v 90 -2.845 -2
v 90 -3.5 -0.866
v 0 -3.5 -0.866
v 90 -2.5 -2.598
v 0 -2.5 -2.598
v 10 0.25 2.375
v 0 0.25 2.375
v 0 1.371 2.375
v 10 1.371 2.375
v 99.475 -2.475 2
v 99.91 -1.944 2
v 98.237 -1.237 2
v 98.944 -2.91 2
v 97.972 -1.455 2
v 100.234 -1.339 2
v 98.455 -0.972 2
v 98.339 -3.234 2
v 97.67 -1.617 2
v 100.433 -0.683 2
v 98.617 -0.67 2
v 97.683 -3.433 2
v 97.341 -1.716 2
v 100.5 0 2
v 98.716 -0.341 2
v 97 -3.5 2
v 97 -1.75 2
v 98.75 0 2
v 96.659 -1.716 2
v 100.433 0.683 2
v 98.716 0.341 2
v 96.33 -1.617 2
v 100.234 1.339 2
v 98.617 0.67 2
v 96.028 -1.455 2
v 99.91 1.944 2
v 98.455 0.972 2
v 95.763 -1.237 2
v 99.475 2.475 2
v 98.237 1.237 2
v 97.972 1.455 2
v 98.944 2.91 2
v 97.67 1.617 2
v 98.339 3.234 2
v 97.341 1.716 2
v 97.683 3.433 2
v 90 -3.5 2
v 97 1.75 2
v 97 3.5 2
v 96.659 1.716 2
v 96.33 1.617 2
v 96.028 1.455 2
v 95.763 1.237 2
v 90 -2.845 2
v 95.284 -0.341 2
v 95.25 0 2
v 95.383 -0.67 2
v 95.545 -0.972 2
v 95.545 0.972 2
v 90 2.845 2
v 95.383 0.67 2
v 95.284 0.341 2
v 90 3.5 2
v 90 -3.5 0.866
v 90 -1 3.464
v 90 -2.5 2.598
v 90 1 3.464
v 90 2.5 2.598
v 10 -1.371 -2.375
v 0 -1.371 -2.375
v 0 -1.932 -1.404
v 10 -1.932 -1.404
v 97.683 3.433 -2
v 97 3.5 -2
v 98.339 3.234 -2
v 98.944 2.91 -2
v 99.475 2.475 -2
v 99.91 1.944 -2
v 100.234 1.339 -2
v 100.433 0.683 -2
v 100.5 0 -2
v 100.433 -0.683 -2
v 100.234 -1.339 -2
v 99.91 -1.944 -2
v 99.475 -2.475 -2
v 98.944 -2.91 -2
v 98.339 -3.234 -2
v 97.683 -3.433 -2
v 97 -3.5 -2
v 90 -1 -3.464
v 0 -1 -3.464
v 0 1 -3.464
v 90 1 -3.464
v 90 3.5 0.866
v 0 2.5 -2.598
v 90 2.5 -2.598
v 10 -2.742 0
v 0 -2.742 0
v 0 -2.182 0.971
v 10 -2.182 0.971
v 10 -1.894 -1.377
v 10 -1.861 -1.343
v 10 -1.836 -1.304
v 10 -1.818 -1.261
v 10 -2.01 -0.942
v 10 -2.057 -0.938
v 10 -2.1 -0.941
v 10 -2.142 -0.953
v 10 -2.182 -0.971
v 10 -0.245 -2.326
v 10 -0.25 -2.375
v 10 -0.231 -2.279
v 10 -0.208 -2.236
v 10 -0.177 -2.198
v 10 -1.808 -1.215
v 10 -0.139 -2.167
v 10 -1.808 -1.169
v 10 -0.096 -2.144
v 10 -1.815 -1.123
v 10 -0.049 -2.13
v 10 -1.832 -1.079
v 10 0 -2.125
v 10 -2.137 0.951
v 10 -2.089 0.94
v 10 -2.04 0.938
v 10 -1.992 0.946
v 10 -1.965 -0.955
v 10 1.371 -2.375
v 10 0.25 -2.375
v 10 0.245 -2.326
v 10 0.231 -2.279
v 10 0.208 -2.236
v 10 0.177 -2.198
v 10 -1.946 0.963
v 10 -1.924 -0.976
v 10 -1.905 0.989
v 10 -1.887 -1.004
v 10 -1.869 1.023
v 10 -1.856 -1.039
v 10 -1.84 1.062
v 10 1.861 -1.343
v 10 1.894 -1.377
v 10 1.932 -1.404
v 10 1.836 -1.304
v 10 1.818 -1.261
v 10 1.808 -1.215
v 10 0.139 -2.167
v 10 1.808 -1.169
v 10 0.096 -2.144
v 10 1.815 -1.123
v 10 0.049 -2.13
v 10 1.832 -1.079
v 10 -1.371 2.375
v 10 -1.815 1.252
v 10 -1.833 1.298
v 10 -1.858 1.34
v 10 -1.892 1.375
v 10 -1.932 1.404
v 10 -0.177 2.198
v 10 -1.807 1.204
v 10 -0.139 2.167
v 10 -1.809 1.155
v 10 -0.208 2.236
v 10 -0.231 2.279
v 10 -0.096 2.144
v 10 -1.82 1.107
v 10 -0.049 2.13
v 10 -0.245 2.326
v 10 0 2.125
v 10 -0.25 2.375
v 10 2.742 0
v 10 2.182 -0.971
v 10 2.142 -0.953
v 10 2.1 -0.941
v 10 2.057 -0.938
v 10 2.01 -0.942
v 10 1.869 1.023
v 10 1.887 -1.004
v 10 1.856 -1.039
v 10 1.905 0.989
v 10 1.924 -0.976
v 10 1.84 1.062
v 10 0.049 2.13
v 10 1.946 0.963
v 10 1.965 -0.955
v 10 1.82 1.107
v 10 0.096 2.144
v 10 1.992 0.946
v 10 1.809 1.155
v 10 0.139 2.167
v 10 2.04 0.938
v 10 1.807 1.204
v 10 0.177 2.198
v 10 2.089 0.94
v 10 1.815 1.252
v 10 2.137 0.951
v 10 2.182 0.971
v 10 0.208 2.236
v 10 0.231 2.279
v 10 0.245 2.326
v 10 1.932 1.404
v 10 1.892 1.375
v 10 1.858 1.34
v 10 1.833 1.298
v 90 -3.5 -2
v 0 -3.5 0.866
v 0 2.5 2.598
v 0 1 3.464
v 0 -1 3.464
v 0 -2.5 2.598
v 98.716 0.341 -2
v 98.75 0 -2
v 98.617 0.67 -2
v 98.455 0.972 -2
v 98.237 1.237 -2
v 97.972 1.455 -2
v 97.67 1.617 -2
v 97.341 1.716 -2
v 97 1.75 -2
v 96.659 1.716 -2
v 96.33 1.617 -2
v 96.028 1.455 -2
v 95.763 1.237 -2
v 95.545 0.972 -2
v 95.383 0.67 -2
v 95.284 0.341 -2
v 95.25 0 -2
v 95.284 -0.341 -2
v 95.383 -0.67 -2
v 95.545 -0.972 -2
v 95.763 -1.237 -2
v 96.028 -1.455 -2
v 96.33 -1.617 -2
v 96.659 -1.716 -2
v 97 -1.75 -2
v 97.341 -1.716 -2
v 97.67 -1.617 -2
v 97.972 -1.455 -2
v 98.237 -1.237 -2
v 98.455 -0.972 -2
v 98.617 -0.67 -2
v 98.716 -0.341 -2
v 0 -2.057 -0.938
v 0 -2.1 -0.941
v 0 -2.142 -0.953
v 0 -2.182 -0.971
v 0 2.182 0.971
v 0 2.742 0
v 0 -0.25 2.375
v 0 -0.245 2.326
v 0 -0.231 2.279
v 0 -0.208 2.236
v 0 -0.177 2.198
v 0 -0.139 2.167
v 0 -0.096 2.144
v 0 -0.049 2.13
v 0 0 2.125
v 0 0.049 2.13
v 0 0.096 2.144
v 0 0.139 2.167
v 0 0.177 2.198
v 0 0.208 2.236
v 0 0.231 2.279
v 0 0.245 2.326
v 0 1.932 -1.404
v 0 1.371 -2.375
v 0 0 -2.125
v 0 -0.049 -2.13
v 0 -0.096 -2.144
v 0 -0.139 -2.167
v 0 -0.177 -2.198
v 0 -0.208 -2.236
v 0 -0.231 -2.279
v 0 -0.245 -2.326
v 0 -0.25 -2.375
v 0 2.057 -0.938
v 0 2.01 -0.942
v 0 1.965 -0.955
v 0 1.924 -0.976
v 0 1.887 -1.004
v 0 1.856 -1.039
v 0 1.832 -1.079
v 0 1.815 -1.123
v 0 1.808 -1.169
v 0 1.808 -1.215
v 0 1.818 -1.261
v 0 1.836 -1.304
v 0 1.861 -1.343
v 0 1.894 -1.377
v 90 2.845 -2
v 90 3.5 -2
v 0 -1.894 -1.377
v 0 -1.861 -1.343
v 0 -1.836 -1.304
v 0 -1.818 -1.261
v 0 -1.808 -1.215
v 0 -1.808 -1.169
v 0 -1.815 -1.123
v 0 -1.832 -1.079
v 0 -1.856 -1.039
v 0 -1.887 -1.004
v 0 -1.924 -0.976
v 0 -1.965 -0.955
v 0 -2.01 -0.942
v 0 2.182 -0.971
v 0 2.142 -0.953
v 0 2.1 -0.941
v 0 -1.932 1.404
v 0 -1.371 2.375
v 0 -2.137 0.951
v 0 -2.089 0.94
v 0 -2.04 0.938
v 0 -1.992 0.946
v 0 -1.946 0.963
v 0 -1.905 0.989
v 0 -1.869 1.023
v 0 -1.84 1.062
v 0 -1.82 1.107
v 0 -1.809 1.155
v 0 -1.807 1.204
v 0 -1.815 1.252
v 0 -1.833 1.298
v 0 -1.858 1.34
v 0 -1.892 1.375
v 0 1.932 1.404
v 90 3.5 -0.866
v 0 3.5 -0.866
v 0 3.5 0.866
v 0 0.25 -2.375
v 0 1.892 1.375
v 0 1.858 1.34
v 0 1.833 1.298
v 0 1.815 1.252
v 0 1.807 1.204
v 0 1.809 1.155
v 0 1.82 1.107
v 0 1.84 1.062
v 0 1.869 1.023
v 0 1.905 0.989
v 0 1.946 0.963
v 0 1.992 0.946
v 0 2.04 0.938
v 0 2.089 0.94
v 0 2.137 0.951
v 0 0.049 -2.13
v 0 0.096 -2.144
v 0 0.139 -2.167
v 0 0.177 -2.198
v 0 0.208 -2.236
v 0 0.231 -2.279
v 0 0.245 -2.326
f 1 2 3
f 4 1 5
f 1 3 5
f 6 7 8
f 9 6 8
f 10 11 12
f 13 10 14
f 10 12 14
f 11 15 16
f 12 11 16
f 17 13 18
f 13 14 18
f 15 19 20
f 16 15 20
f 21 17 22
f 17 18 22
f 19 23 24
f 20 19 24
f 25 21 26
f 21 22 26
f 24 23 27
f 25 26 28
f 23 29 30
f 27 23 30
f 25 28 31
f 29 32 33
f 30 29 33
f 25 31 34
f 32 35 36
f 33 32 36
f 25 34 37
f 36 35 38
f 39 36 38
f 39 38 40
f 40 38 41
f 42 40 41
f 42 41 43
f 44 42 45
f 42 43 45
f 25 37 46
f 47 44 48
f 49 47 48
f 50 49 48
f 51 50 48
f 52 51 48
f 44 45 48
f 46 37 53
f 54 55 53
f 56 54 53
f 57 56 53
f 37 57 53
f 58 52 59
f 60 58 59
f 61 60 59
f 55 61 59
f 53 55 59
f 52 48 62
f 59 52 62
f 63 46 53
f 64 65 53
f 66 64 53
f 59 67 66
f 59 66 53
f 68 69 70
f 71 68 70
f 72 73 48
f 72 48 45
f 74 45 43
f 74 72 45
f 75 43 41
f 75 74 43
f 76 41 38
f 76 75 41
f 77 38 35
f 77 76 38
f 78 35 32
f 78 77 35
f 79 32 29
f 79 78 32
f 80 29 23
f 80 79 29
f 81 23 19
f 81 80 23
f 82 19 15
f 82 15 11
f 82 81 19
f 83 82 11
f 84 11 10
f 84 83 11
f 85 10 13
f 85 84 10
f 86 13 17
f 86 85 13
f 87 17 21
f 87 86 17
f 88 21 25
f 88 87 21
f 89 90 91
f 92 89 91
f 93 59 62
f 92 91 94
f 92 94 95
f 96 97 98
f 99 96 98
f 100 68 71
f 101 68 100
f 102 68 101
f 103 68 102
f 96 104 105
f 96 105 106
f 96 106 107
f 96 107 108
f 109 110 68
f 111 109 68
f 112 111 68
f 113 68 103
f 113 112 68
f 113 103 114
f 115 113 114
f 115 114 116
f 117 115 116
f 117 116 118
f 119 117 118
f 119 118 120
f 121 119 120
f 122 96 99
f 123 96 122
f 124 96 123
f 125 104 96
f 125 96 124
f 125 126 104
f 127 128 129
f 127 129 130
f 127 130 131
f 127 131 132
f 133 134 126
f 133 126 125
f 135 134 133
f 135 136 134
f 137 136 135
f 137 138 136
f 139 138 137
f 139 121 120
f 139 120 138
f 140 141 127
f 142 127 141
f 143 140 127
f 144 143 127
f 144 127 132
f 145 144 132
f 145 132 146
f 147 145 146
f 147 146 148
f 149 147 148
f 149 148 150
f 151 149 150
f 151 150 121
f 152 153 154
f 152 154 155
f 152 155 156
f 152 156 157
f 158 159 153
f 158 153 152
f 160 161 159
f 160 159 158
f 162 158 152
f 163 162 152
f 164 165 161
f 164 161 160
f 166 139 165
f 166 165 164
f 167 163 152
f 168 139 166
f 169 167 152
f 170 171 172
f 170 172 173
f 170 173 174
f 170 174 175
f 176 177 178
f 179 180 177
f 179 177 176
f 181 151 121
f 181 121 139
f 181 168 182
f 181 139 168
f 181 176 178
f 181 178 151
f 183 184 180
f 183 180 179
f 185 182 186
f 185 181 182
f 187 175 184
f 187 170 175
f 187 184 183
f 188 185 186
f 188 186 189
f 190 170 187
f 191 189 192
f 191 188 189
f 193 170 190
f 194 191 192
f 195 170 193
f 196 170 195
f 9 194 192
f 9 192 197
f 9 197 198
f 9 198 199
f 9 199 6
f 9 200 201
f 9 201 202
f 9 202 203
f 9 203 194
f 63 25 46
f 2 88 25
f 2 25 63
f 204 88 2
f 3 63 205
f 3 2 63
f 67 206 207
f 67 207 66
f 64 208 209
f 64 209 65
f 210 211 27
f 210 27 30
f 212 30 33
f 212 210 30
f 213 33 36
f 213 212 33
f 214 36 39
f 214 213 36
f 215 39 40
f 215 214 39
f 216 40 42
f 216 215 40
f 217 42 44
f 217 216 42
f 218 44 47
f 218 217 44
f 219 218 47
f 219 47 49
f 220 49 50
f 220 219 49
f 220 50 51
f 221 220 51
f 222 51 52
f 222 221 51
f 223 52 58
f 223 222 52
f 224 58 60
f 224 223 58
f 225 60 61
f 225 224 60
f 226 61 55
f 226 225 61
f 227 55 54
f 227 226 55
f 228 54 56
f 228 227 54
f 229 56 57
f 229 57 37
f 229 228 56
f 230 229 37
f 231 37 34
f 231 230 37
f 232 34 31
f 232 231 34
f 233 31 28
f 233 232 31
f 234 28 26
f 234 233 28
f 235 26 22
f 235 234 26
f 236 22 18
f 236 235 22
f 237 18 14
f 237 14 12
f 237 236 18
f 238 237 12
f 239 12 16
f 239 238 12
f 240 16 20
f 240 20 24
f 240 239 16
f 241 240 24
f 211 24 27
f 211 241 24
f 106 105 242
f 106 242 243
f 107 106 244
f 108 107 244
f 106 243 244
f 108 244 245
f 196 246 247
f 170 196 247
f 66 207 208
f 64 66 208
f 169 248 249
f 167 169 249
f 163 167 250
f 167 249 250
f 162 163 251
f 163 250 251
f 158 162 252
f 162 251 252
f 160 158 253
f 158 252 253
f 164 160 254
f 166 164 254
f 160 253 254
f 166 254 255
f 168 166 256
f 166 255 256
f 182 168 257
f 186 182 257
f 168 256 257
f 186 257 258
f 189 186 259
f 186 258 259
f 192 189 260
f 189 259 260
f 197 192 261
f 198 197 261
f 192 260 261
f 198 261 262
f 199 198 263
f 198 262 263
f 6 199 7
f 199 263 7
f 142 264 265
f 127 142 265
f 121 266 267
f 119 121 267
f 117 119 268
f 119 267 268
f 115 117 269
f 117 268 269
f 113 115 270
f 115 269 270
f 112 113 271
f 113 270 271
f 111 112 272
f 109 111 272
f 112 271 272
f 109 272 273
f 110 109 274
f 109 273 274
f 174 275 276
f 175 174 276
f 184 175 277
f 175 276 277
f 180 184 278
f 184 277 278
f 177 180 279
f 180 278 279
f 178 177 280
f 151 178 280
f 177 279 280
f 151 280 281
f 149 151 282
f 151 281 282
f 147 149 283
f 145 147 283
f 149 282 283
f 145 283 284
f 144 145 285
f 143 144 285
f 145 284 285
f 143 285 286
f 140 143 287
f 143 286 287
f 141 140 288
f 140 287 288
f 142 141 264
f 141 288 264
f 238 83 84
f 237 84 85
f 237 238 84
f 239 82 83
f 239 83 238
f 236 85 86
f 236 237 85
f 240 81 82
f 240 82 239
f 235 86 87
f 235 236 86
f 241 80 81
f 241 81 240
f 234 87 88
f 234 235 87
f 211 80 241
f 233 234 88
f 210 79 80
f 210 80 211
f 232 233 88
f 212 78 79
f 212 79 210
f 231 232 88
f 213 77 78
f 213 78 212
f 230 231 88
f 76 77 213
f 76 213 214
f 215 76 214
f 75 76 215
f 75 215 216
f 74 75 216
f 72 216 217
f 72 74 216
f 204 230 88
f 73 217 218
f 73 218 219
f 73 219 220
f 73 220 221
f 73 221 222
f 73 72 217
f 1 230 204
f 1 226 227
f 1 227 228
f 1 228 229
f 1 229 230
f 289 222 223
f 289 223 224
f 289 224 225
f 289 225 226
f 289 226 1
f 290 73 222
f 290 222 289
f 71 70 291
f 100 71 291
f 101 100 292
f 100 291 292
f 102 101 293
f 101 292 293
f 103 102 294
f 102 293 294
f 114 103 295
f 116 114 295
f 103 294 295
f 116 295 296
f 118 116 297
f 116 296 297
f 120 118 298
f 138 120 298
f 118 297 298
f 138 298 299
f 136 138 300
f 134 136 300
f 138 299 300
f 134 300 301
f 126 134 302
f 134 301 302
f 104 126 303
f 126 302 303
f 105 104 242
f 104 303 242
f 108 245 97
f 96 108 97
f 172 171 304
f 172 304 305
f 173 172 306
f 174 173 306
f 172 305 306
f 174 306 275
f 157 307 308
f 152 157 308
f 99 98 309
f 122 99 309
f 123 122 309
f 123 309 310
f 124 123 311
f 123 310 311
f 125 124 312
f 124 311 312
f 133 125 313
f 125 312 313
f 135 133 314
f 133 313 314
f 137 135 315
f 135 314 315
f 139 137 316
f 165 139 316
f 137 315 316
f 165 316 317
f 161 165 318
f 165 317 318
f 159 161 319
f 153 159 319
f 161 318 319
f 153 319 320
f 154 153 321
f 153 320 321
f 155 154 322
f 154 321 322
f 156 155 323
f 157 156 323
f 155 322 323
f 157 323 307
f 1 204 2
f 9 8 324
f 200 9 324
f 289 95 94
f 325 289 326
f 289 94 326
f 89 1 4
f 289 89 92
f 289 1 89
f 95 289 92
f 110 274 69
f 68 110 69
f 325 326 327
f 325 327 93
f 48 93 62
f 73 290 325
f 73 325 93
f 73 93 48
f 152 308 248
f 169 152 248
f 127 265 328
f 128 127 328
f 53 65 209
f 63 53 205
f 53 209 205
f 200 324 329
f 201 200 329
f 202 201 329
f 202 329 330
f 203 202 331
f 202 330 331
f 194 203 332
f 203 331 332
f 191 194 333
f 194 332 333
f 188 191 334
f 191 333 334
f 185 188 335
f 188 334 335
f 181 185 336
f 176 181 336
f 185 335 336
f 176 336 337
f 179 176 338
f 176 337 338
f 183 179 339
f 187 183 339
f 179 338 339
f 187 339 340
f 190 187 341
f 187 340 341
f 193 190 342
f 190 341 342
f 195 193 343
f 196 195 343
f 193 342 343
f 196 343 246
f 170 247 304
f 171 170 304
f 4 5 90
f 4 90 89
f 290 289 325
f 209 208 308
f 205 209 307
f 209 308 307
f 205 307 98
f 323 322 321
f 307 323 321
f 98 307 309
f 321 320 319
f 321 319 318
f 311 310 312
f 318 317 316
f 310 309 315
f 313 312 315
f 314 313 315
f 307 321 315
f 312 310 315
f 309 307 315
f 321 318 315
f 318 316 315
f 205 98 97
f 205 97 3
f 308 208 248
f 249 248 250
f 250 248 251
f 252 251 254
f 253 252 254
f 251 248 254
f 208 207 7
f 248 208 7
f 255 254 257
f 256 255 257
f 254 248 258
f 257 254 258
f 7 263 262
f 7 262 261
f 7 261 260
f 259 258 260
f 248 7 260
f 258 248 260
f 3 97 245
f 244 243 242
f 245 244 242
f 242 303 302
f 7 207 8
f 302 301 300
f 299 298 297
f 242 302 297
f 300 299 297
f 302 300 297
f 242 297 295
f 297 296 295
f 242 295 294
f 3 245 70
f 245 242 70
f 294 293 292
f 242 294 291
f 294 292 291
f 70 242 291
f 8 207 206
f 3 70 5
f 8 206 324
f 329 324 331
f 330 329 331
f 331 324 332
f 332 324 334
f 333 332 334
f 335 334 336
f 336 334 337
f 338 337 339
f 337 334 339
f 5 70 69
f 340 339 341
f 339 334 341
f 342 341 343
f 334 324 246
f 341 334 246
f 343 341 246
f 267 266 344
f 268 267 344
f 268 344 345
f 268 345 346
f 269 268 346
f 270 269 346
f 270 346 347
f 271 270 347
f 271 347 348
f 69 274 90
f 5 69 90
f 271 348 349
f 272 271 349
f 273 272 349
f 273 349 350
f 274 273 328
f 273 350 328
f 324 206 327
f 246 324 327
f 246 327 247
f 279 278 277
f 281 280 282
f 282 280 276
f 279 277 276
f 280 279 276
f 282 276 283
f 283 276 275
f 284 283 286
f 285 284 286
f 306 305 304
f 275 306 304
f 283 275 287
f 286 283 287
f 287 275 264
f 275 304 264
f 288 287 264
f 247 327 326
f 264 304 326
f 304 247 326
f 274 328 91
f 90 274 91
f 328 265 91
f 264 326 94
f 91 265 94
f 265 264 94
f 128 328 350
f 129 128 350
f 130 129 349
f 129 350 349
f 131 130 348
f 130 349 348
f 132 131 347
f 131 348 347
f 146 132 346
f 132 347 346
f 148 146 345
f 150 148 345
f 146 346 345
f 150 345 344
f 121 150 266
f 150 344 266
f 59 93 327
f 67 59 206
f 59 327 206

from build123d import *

# Parameters (mm, degrees)
BOSS_EXTRUDE1_DEPTH      = 90
CUT_EXTRUDE1_DEPTH       = 10
CHAMFER1_SIZE            = 1
CHAMFER1_EDGE_2_SIZE     = 1
CHAMFER1_EDGE_3_SIZE     = 1
CHAMFER1_EDGE_4_SIZE     = 1
CHAMFER1_EDGE_5_SIZE     = 1
CHAMFER1_EDGE_6_SIZE     = 1
BOSS_EXTRUDE2_DEPTH      = 2
BOSS_EXTRUDE2_DEPTH_BACK = 2
SKETCH2_R                = 1.75


with BuildPart() as part:
    # Sketch1 → Boss-Extrude1 (new body)
    with BuildSketch(Plane(origin=(0, 0, 0), x_dir=(0, 0, -1), z_dir=(1, 0, 0))):
        Polygon((3.464101615, -2), (3.464101615, 2), (0, 4), (-3.464101615, 2), (-3.464101615, -2), (0, -4), align=None)
    extrude(amount=BOSS_EXTRUDE1_DEPTH)

    # Sketch5 → Cut-Extrude1 (cut)
    with BuildSketch(Plane.ZY):
        with BuildLine():
            Line((1.404006351, -1.931810334), (2.375, -1.371206889))
            Line((2.375, -1.371206889), (2.375, -0.25))
            ThreePointArc((2.375, -0.25), (2.125, 0), (2.375, 0.25))
            Line((2.375, 0.25), (2.375, 1.371206889))
            Line((2.375, 1.371206889), (1.404006351, 1.931810334))
            ThreePointArc((1.404006351, 1.931810334), (1.0625, 1.840303983), (0.970993649, 2.181810334))
            Line((0.970993649, 2.181810334), (0, 2.742413779))
            Line((0, 2.742413779), (-0.970993649, 2.181810334))
            ThreePointArc((-0.970993649, 2.181810334), (-0.946018543, 2.121515095), (-0.9375, 2.056810334))
            ThreePointArc((-0.9375, 2.056810334), (-1.122795239, 1.815328877), (-1.404006351, 1.931810334))
            Line((-1.404006351, 1.931810334), (-2.375, 1.371206889))
            Line((-2.375, 1.371206889), (-2.375, 0.25))
            ThreePointArc((-2.375, 0.25), (-2.198223305, 0.176776695), (-2.125, 0))
            ThreePointArc((-2.125, 0), (-2.198223305, -0.176776695), (-2.375, -0.25))
            Line((-2.375, -0.25), (-2.375, -1.371206889))
            Line((-2.375, -1.371206889), (-1.404006351, -1.931810334))
            ThreePointArc((-1.404006351, -1.931810334), (-1.122795239, -1.815328877), (-0.9375, -2.056810334))
            ThreePointArc((-0.9375, -2.056810334), (-0.946018543, -2.121515095), (-0.970993649, -2.181810334))
            Line((-0.970993649, -2.181810334), (0, -2.742413779))
            Line((0, -2.742413779), (0.970993649, -2.181810334))
            ThreePointArc((0.970993649, -2.181810334), (1.0625, -1.840303983), (1.404006351, -1.931810334))
        make_face()
    extrude(amount=-CUT_EXTRUDE1_DEPTH, mode=Mode.SUBTRACT)

    # Chamfer1
    chamfer1_edges = [part.edges().sort_by_distance(p)[0] for p in [
        (45, -4, 0),
    ]]
    chamfer(chamfer1_edges, length=CHAMFER1_SIZE)

    # Chamfer1 edge 2
    chamfer1_edge_2_edges = [part.edges().sort_by_distance(p)[0] for p in [
        (45, -2, 3.464101615),
    ]]
    chamfer(chamfer1_edge_2_edges, length=CHAMFER1_EDGE_2_SIZE)

    # Chamfer1 edge 3
    chamfer1_edge_3_edges = [part.edges().sort_by_distance(p)[0] for p in [
        (45, 2, 3.464101615),
    ]]
    chamfer(chamfer1_edge_3_edges, length=CHAMFER1_EDGE_3_SIZE)

    # Chamfer1 edge 4
    chamfer1_edge_4_edges = [part.edges().sort_by_distance(p)[0] for p in [
        (45, 4, 0),
    ]]
    chamfer(chamfer1_edge_4_edges, length=CHAMFER1_EDGE_4_SIZE)

    # Chamfer1 edge 5
    chamfer1_edge_5_edges = [part.edges().sort_by_distance(p)[0] for p in [
        (45, 2, -3.464101615),
    ]]
    chamfer(chamfer1_edge_5_edges, length=CHAMFER1_EDGE_5_SIZE)

    # Chamfer1 edge 6
    chamfer1_edge_6_edges = [part.edges().sort_by_distance(p)[0] for p in [
        (45, -2, -3.464101615),
    ]]
    chamfer(chamfer1_edge_6_edges, length=CHAMFER1_EDGE_6_SIZE)

    # Sketch2 → Boss-Extrude2 (add, two sides: drawn at the far end of the back side and taken through both)
    with BuildSketch(Plane.XY.offset(-BOSS_EXTRUDE2_DEPTH_BACK)):
        with BuildLine():
            Line((90, 3.5), (97, 3.5))
            ThreePointArc((97, 3.5), (100.5, 0), (97, -3.5))
            Line((97, -3.5), (90, -3.5))
            Line((90, -3.5), (90, 3.5))
        make_face()
        with Locations((97, 0)):
            Circle(SKETCH2_R, mode=Mode.SUBTRACT)
    extrude(amount=BOSS_EXTRUDE2_DEPTH + BOSS_EXTRUDE2_DEPTH_BACK)


solid = part.part
